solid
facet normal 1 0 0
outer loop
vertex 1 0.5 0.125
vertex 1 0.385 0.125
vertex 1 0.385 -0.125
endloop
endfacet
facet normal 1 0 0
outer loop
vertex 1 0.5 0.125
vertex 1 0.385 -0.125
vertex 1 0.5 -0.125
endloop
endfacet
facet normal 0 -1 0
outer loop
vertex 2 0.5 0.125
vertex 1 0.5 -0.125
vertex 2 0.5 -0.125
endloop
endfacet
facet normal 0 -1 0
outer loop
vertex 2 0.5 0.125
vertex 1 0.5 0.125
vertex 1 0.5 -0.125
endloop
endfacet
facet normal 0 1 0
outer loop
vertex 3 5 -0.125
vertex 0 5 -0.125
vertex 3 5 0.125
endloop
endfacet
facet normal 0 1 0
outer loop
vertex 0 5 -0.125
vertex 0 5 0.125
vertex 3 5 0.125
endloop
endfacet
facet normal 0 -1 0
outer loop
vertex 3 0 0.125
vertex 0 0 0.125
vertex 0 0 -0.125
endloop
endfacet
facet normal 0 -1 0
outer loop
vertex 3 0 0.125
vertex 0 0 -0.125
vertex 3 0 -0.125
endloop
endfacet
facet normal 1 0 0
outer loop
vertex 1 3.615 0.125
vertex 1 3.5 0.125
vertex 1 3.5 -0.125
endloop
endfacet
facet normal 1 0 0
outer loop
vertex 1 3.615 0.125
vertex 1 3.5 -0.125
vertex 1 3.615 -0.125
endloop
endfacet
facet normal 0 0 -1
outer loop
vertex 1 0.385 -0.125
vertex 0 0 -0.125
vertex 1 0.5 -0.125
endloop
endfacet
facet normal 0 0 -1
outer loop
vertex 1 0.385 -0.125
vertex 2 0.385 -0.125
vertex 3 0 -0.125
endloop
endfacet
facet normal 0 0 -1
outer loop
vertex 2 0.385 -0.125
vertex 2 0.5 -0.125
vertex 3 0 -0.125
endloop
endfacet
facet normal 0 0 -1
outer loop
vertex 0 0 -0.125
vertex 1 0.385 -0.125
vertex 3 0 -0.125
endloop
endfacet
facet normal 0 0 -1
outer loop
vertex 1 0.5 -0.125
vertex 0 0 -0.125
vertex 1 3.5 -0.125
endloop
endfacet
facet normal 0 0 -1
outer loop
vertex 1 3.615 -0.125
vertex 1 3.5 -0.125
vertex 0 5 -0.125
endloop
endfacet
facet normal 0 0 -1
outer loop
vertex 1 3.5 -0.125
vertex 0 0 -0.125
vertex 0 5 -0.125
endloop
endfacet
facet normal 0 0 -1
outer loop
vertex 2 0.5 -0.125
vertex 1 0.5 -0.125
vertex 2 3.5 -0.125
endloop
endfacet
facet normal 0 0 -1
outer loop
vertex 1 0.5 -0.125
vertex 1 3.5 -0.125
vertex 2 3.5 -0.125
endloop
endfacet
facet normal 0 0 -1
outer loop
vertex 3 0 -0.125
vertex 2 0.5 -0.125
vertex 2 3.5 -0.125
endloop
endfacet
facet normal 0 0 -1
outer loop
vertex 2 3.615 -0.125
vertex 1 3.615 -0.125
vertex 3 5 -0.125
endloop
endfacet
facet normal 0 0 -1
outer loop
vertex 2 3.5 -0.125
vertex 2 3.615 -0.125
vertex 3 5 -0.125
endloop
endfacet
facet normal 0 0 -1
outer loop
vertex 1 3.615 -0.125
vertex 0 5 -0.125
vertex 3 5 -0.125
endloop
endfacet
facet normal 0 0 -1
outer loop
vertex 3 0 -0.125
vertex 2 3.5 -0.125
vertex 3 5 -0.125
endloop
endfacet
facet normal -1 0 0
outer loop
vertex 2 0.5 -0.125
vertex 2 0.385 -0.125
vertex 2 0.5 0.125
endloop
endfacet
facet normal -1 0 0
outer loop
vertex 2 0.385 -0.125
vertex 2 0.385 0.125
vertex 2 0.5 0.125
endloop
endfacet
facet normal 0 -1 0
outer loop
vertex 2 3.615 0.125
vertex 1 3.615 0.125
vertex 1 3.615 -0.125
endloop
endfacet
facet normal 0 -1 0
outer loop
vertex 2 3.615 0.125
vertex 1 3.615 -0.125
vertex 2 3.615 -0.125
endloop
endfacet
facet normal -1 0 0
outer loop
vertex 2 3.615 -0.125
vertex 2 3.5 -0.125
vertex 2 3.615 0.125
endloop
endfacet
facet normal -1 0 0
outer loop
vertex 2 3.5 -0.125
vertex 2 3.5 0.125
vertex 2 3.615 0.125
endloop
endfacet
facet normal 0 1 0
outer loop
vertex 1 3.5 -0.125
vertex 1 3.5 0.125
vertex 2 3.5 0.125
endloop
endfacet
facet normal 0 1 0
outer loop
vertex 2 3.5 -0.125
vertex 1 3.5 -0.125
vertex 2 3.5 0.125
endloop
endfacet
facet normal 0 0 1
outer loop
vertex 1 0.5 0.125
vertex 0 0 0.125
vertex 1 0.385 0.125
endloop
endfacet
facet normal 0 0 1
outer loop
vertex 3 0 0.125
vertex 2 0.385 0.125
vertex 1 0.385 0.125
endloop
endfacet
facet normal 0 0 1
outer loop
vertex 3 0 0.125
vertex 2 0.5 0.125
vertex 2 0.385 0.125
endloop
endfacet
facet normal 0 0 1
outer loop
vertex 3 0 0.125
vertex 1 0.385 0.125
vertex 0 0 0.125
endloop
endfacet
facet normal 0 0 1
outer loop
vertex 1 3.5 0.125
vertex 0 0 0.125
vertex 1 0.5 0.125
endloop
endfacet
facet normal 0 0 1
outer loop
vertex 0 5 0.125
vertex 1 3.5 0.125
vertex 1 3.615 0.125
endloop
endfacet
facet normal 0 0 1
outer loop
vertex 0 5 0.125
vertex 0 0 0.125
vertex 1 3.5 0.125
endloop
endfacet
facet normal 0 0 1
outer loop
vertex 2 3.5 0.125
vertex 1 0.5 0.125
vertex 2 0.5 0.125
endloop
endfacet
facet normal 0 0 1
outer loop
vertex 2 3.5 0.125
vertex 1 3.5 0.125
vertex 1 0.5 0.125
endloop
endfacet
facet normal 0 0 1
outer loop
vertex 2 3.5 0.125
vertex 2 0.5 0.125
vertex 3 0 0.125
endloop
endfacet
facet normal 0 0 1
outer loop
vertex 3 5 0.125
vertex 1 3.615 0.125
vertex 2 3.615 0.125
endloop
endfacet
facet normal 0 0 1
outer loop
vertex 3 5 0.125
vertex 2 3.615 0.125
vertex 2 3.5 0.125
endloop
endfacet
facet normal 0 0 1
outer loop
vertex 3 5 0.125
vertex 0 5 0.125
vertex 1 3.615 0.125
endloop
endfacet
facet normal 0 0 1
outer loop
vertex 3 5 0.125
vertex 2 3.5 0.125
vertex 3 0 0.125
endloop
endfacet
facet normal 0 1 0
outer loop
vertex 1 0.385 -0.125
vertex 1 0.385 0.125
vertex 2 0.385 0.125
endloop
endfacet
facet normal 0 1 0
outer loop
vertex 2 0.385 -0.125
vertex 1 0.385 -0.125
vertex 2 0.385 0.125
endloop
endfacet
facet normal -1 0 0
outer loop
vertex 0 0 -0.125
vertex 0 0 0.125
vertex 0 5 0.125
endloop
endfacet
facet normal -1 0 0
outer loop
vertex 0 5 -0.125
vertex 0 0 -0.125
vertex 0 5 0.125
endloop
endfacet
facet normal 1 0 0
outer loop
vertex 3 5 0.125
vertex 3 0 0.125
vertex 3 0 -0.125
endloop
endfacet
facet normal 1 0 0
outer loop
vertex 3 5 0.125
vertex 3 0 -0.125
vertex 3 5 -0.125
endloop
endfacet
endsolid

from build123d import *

# Parameters (mm, degrees)
FRAME_OUTLINE_W     = 3
FRAME_OUTLINE_H     = 5
FRAME_OUTLINE_W_2   = 1
FRAME_OUTLINE_H_2   = 0.115
BOSS_EXTRUDE1_DEPTH = 0.125


with BuildPart() as part:
    # frame_outline → Boss-Extrude1 (new, symmetric)
    with BuildSketch(Plane.XY):
        with Locations((1.5, 2.5)):
            Rectangle(FRAME_OUTLINE_W, FRAME_OUTLINE_H)
        with Locations((1.5, 3.5575)):
            Rectangle(FRAME_OUTLINE_W_2, FRAME_OUTLINE_H_2, mode=Mode.SUBTRACT)
        with Locations((1.5, 0.4425)):
            Rectangle(FRAME_OUTLINE_W_2, FRAME_OUTLINE_H_2, mode=Mode.SUBTRACT)
    extrude(amount=BOSS_EXTRUDE1_DEPTH, both=True)


solid = part.part
